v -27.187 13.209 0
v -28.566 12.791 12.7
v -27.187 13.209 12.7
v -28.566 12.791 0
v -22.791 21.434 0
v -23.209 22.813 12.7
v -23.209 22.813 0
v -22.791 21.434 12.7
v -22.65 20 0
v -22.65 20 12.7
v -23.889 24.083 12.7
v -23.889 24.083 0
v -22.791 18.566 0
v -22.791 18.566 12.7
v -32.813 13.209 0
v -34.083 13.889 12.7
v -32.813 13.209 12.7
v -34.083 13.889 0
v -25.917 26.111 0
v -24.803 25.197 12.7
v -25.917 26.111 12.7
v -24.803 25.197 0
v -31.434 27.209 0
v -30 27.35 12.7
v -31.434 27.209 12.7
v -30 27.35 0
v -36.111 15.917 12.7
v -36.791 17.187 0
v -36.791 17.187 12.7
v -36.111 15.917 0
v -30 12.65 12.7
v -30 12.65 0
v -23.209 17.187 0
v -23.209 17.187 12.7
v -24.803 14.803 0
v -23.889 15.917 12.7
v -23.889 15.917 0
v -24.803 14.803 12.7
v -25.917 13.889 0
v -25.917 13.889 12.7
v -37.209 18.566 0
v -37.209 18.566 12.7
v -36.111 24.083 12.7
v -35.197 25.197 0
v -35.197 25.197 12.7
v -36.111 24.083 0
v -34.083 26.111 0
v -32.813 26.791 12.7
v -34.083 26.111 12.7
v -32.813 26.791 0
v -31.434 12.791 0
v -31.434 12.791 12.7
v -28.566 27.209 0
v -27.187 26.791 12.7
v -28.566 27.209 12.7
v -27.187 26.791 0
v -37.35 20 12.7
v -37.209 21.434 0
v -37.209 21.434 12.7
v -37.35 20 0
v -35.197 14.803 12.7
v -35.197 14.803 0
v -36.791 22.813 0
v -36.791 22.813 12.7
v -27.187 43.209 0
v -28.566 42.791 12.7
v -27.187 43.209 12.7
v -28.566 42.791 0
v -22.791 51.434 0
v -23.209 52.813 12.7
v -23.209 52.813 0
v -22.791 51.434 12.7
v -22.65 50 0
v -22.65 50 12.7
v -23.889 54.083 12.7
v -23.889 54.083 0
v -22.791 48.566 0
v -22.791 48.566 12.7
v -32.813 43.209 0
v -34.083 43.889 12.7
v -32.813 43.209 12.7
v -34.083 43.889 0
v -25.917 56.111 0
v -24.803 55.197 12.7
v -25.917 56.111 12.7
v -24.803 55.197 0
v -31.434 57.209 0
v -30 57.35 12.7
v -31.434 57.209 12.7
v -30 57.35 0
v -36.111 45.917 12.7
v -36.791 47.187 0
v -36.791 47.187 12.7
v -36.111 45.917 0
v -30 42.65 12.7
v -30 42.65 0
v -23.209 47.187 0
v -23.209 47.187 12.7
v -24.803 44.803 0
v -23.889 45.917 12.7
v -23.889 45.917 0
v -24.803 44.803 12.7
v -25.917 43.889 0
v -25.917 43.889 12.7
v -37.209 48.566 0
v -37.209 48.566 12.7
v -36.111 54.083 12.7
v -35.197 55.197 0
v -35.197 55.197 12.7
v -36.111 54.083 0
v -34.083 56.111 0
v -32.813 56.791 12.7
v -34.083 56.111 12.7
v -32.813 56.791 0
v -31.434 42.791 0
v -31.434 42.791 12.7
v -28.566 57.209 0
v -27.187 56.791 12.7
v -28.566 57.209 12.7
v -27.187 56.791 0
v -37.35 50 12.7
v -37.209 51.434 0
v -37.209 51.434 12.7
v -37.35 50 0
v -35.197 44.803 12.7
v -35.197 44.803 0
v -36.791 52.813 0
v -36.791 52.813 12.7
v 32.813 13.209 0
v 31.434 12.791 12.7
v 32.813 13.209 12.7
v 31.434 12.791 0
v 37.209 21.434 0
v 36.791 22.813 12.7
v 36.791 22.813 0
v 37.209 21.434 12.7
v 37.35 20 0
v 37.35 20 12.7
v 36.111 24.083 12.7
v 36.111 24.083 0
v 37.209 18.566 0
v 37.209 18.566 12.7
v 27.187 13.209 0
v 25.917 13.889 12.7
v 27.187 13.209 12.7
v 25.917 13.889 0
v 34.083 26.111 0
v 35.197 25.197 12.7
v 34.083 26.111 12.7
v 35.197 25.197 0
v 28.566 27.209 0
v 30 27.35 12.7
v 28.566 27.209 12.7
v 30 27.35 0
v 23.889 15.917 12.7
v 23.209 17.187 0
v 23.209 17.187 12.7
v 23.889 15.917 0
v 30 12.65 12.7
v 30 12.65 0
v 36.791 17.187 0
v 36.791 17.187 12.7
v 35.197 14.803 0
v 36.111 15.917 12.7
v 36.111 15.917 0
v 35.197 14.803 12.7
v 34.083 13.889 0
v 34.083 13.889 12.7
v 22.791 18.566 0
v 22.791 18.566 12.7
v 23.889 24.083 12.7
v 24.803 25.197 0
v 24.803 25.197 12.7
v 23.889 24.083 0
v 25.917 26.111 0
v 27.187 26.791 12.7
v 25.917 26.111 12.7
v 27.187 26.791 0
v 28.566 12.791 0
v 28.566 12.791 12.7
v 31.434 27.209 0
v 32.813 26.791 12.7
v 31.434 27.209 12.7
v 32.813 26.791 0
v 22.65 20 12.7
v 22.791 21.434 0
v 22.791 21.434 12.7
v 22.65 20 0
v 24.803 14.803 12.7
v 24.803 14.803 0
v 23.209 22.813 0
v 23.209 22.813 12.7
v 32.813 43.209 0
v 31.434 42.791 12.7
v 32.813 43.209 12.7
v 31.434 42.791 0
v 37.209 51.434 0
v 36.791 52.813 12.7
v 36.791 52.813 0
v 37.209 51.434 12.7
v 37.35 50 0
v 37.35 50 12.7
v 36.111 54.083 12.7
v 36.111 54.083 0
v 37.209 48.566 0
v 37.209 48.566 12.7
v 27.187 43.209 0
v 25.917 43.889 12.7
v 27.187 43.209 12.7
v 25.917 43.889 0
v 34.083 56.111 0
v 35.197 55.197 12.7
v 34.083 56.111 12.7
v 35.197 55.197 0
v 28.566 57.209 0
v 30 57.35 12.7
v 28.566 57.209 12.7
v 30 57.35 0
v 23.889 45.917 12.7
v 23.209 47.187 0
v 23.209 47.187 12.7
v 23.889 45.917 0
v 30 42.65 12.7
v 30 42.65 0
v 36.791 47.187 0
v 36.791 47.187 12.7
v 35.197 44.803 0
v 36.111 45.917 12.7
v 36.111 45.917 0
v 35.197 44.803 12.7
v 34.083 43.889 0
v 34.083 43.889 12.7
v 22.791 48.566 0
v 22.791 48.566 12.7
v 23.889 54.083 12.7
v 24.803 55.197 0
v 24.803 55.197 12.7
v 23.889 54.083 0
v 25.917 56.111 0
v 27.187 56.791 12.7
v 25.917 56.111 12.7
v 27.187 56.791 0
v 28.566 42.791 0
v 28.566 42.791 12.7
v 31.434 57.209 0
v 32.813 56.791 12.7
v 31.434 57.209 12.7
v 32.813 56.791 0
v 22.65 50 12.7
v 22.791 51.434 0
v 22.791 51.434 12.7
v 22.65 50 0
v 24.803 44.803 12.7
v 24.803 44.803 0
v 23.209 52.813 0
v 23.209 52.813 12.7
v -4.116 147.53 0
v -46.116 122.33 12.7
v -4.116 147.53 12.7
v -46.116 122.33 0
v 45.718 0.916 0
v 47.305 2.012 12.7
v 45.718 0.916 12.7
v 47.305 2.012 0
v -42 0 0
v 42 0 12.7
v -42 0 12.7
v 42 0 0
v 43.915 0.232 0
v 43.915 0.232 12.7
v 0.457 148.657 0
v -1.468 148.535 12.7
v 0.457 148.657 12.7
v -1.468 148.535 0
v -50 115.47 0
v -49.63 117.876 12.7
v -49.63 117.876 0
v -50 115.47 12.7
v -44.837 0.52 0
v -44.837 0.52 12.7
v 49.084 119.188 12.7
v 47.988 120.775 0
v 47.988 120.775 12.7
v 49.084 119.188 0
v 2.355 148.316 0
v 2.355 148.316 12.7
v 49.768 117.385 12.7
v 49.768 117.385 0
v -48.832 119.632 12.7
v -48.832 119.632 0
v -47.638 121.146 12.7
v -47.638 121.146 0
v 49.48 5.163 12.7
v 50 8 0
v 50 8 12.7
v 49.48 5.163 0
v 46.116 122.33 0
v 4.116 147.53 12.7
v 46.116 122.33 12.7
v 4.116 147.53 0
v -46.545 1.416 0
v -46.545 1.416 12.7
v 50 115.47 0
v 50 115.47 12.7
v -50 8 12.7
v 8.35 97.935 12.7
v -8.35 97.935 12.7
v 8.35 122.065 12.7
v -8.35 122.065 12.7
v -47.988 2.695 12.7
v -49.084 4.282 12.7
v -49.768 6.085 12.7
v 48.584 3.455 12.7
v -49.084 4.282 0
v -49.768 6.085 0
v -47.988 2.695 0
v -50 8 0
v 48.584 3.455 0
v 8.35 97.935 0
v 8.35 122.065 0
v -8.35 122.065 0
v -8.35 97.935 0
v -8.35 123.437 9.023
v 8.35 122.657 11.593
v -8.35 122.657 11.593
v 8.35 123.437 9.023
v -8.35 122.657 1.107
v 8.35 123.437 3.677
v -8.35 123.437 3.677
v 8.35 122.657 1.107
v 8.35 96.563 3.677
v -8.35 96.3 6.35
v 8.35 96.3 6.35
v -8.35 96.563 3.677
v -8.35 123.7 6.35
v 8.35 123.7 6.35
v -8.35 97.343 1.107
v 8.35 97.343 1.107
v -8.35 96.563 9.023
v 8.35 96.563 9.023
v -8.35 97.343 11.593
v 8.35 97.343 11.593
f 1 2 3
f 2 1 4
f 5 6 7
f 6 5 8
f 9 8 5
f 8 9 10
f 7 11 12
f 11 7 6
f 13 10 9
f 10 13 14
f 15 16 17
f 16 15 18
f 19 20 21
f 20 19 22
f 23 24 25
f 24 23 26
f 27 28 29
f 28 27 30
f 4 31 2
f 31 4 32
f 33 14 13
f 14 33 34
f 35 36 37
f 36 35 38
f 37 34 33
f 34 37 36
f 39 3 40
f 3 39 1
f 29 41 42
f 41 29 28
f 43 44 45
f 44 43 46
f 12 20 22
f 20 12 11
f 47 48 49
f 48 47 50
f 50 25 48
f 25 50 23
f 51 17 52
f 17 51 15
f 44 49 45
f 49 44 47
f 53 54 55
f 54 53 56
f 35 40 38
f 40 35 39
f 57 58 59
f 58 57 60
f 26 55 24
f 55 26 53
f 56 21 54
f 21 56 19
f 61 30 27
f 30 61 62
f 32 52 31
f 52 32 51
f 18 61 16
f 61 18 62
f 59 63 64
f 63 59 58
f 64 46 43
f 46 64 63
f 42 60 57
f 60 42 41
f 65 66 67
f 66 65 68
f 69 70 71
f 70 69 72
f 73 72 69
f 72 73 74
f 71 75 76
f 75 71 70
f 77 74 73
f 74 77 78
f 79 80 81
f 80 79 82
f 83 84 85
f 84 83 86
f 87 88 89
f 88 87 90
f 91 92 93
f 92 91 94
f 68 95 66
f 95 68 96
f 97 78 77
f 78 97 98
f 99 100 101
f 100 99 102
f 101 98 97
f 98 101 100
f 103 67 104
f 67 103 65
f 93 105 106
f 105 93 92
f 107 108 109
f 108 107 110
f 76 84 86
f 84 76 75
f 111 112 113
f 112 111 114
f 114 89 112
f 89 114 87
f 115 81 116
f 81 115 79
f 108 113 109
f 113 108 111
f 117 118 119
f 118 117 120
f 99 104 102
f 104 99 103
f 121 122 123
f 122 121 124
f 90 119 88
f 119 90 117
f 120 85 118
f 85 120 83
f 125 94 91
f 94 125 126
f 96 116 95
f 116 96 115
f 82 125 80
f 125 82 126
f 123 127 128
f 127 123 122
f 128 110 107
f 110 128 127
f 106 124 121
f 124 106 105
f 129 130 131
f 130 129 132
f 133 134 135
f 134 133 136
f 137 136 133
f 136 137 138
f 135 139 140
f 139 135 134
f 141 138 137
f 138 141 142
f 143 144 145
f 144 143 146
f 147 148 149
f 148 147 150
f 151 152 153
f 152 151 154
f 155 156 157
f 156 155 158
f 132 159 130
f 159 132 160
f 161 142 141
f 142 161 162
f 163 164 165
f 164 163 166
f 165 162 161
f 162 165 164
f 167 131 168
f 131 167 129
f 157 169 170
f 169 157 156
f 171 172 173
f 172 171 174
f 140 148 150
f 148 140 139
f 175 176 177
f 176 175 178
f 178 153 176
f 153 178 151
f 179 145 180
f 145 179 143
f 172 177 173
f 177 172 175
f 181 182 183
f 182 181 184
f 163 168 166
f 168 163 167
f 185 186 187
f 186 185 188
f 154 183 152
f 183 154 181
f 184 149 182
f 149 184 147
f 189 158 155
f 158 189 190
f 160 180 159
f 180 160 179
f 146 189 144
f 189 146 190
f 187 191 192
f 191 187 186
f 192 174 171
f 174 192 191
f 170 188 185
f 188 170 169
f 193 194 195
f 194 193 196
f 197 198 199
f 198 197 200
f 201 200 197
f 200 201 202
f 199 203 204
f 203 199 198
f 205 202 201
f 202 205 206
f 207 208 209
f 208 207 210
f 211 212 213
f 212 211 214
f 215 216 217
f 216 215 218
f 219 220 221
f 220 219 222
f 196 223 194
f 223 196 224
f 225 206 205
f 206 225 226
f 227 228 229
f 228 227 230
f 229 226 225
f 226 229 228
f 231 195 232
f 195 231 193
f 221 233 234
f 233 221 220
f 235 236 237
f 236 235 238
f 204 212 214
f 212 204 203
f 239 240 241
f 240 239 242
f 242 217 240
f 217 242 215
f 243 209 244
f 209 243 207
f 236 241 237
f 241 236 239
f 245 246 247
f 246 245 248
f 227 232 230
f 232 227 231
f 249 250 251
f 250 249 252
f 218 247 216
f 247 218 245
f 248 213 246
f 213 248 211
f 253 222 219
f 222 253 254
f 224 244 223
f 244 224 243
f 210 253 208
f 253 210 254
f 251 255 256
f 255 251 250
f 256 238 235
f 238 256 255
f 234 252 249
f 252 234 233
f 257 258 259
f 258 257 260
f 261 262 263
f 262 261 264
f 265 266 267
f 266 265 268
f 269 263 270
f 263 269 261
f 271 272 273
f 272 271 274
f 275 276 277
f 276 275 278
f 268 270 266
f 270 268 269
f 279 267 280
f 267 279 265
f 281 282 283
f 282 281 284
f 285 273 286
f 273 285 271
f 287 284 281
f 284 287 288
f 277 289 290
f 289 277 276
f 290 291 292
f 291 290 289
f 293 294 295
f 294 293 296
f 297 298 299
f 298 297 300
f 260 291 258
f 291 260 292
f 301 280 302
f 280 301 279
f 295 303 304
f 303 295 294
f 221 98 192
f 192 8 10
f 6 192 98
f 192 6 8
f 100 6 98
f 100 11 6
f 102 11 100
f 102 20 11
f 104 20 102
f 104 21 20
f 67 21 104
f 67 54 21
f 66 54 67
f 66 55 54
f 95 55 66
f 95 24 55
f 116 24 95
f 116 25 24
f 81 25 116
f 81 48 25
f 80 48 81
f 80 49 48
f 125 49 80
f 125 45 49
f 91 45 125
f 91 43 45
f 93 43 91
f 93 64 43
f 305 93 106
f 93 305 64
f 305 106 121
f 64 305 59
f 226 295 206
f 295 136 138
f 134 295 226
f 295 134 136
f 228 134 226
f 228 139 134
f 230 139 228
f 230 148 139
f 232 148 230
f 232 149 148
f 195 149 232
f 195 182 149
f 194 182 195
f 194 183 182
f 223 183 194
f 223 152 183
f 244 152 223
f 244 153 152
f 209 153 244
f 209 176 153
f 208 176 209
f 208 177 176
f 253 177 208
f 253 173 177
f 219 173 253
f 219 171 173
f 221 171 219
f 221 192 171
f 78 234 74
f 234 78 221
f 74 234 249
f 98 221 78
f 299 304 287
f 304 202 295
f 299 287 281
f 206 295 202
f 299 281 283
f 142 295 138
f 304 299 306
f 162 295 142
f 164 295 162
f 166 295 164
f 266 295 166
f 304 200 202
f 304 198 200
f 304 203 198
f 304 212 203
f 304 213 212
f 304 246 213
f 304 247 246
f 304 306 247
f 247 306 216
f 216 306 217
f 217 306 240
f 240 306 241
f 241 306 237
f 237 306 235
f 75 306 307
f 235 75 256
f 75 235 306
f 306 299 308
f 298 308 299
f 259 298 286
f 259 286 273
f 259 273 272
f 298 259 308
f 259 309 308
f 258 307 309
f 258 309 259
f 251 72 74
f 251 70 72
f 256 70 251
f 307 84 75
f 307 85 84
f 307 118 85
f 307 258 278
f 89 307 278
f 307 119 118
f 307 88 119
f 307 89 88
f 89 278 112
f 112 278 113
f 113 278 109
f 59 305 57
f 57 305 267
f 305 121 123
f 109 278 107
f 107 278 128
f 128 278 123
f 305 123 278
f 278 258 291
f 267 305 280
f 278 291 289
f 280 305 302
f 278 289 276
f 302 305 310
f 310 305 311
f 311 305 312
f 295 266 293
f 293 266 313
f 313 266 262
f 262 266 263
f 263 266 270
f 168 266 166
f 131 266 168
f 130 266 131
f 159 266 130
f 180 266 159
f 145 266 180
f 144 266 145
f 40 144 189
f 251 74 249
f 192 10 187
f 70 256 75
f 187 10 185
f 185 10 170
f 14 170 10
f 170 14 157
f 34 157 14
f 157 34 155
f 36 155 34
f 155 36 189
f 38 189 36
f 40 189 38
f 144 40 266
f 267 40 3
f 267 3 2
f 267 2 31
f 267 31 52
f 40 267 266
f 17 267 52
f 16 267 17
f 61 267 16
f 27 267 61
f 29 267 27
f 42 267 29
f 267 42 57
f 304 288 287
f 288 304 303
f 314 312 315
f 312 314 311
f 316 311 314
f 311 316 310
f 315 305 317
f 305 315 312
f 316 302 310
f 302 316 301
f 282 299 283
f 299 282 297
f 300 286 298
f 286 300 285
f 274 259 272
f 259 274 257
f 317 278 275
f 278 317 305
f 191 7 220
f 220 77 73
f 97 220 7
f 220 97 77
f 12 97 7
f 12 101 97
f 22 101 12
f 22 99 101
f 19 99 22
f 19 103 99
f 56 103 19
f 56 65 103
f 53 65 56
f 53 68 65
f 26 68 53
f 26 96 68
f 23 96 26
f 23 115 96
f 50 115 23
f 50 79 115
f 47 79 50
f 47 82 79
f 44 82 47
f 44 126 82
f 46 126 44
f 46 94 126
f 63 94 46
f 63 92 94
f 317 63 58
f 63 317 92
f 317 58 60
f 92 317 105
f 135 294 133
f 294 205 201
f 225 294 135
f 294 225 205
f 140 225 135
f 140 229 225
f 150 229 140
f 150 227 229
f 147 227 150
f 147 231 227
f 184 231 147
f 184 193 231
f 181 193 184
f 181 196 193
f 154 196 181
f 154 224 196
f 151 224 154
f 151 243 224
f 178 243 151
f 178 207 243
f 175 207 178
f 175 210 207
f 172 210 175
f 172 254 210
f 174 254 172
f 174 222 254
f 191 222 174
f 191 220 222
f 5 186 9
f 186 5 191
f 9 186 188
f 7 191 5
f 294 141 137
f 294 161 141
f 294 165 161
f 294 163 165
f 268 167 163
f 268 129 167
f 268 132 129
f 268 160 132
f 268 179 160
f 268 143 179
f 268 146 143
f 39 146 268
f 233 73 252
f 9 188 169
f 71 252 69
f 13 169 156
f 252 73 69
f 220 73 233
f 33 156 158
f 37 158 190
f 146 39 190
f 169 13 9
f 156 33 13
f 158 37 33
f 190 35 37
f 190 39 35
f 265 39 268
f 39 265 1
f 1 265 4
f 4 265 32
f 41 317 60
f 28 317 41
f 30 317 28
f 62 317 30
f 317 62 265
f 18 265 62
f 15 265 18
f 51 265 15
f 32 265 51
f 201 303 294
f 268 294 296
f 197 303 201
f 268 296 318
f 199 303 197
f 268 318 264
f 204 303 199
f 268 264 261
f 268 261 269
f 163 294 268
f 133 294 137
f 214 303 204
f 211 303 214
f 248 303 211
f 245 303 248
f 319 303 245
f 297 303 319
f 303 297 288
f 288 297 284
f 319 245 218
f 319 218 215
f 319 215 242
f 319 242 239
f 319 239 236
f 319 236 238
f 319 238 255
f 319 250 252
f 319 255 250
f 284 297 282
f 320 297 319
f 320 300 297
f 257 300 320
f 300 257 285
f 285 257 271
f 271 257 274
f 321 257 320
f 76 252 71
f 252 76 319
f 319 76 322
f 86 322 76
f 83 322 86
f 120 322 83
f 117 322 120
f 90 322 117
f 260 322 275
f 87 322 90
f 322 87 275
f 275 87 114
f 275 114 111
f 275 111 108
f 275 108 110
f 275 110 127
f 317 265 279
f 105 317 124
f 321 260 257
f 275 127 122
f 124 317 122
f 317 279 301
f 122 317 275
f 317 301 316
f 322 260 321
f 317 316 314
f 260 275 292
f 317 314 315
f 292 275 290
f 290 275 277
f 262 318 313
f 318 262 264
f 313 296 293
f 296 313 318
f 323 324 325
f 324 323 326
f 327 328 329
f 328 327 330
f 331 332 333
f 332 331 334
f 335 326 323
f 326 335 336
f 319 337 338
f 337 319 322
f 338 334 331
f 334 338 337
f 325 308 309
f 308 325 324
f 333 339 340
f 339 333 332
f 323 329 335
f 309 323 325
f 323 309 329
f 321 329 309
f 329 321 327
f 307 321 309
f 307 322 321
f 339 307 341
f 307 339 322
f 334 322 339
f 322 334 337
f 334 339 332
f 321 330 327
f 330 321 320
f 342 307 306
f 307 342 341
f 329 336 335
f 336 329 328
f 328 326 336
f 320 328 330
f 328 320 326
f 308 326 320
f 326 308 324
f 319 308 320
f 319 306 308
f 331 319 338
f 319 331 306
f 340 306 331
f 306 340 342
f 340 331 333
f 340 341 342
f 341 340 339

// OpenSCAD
// file: ../lifetrac_v25_params.scad
// lifetrac_v25_params.scad
// Essential parameters for LifeTrac v25 individual parts
// This file contains only the constants needed for part design
// Full assembly uses lifetrac_v25.scad

// -----------------------------------------------------------------------------
// Compatibility helper
// OpenSCAD throws warnings when the BOSL2 helper `parent_modules()` is missing.
// We provide a stub that returns an empty list so part files can run cleanly
// when opened directly without pulling in BOSL2.
function parent_modules() = is_undef($parent_modules) ? [] : $parent_modules;

// =============================================================================
// MATERIAL CONSTANTS
// =============================================================================

PLATE_1_4_INCH = 6.35;   // 1/4" = 6.35mm
PLATE_1_2_INCH = 12.7;   // 1/2" = 12.7mm
PLATE_3_4_INCH = 19.05;  // 3/4" = 19.05mm
TUBE_3X3_1_4 = [76.2, 6.35];    // 3"x3" x 1/4" wall
TUBE_4X4_1_4 = [101.6, 6.35];   // 4"x4" x 1/4" wall (OSE standard)
TUBE_2X2_1_4 = [50.8, 6.35];    // 2"x2" x 1/4" wall
TUBE_2X4_1_4 = [50.8, 101.6, 6.35]; // 2"x4" rectangular

// Bolt/pin diameters
PIVOT_PIN_DIA = 38.1;    // 1.5" pivot pin
BOLT_DIA_1_2 = 12.7;     // 1/2" bolt
BOLT_DIA_3_4 = 19.05;    // 3/4" bolt
BOLT_DIA_1 = 25.4;       // 1" bolt

// =============================================================================
// MACHINE DIMENSIONS
// =============================================================================

// Target size: between Toro Dingo (915mm wide) and Bobcat (1830mm wide)
MACHINE_WIDTH = 1200;    // Overall width
MACHINE_LENGTH = 1800;   // Overall length
MACHINE_HEIGHT = 1000;   // Height to top of frame
WHEEL_BASE = 1400;       // Distance between front and rear axles
TRACK_WIDTH = 900;       // Distance between centerlines of left/right side panels

// Side panel sandwich configuration
SANDWICH_SPACING = 120;  // Gap between inner and outer panels (for arm pivot)
PANEL_THICKNESS = PLATE_1_2_INCH;

// Wheel dimensions
WHEEL_DIAMETER = 500;    // 500mm diameter wheels
WHEEL_WIDTH = 200;       // 200mm wide wheels
WHEEL_CLEARANCE = 50;    // Clearance between wheel and outer panel

// Ground clearance - bottom of frame above ground
GROUND_CLEARANCE = 150;  // 150mm ground clearance under frame
WHEEL_RADIUS = WHEEL_DIAMETER / 2;

// Frame sits with bottom at GROUND_CLEARANCE height
FRAME_Z_OFFSET = GROUND_CLEARANCE;

// Calculate wheel X offset - wheels positioned outside the outer panels
WHEEL_X_OFFSET = TRACK_WIDTH/2 + SANDWICH_SPACING/2 + PANEL_THICKNESS + WHEEL_WIDTH/2 + WHEEL_CLEARANCE;

// =============================================================================
// LOADER ARM DIMENSIONS
// =============================================================================

// Design constraints
BUCKET_GROUND_CLEARANCE = 0;      // Bucket bottom at ground level when lowered
BUCKET_FRONT_CLEARANCE = 100;     // 100mm (~4") clearance between bucket back and front of machine

// Arm pivot point (at top rear of side panels - tall end)
ARM_PIVOT_Y = 200;  // Near rear of machine, between sandwich plates  
ARM_PIVOT_Z_HEIGHT = MACHINE_HEIGHT - 50;  // Height above frame bottom
ARM_PIVOT_Z = FRAME_Z_OFFSET + ARM_PIVOT_Z_HEIGHT;  // Absolute Z position

// Calculate required arm length
MIN_HORIZONTAL_REACH = WHEEL_BASE + BUCKET_FRONT_CLEARANCE - ARM_PIVOT_Y;
ARM_LENGTH = ceil(sqrt(pow(ARM_PIVOT_Z, 2) + pow(MIN_HORIZONTAL_REACH, 2)));
ARM_GROUND_ANGLE = asin(ARM_PIVOT_Z / ARM_LENGTH);  // Angle below horizontal (degrees)

ARM_TUBE_SIZE = TUBE_3X3_1_4;         // 3"x3" arm tubing
ARM_SPACING = TRACK_WIDTH;            // Distance between arm centerlines

// Arm angle limits
ARM_MIN_ANGLE = -ARM_GROUND_ANGLE;     // Lowest position (at ground)
ARM_MAX_ANGLE = 60;                     // Maximum raised position

// Cross beam configuration
CROSS_BEAM_SIZE = TUBE_2X2_1_4[0];    // 2"x2" tube size
CROSS_BEAM_CLEARANCE = 15;             // Extra clearance around cross beam in cutout
CROSS_BEAM_1_POS = ARM_LENGTH * 0.65;   // First cross beam position
CROSS_BEAM_2_POS = ARM_LENGTH * 0.95;   // Second cross beam position (near bucket)

// Pivot position in panel coordinates (for arc slot calculations)
PIVOT_PANEL_X = ARM_PIVOT_Y;                          // Pivot X in panel coords
PIVOT_PANEL_Y = ARM_PIVOT_Z - FRAME_Z_OFFSET;         // Pivot Y in panel coords

// =============================================================================
// HYDRAULIC CYLINDER MOUNTING POINTS
// =============================================================================

// Lift cylinder mounting points (arms pivot at rear, cylinders attach forward)
LIFT_CYL_BASE_Y = WHEEL_BASE * 0.5;          // Base mount Y position (forward of pivot)
LIFT_CYL_BASE_Z = FRAME_Z_OFFSET + MACHINE_HEIGHT * 0.4;      // Base mount Z position
LIFT_CYL_ARM_OFFSET = ARM_LENGTH * 0.25;     // Attachment point along arm from pivot (proportional)

// =============================================================================
// BUCKET DIMENSIONS
// =============================================================================

BOBCAT_QA_WIDTH = 1168;           // 46" standard width
BOBCAT_QA_HEIGHT = 457;           // 18" plate height
BOBCAT_QA_PIN_DIA = 25.4;         // 1" locking pin

BUCKET_WIDTH = 1100;              // Slightly narrower than QA plate
BUCKET_DEPTH = 600;
BUCKET_HEIGHT = 450;

// =============================================================================
// STANDING DECK DIMENSIONS
// =============================================================================

DECK_WIDTH = 700;
DECK_DEPTH = 400;
DECK_HEIGHT = 250;  // Height above ground
// main file
// cylinder_lug.scad
// Hydraulic cylinder mounting lug for LifeTrac v25
// CNC cut from 1/2" plate steel with center pivot hole

include <../lifetrac_v25_params.scad>

module cylinder_lug() {
    lug_width = 100;
    lug_height = 150;
    
    difference() {
        // Main lug plate with rounded top
        linear_extrude(height=PLATE_1_2_INCH)
        offset(r=8) offset(r=-8)  // Rounded corners
        polygon([
            [-lug_width/2, 0],
            [lug_width/2, 0],
            [lug_width/2, lug_height - 30],
            [0, lug_height],
            [-lug_width/2, lug_height - 30]
        ]);
        
        // Center pivot hole for cylinder pin
        translate([0, lug_height - 40, PLATE_1_2_INCH/2])
        rotate([0, 90, 0])
        cylinder(d=BOLT_DIA_1 + 2, h=PLATE_1_2_INCH+4, center=true, $fn=32);
        
        // Base mounting holes (4 holes)
        for (x = [-lug_width/2 + 20, lug_width/2 - 20]) {
            for (y = [20, 50]) {
                translate([x, y, PLATE_1_2_INCH/2])
                cylinder(d=BOLT_DIA_1_2 + 2, h=PLATE_1_2_INCH+4, center=true, $fn=32);
            }
        }
    }
}

// Render the part for preview/export
if ($preview || len(search("cylinder_lug.scad", parent_modules())) == 0) {
    cylinder_lug();
}
